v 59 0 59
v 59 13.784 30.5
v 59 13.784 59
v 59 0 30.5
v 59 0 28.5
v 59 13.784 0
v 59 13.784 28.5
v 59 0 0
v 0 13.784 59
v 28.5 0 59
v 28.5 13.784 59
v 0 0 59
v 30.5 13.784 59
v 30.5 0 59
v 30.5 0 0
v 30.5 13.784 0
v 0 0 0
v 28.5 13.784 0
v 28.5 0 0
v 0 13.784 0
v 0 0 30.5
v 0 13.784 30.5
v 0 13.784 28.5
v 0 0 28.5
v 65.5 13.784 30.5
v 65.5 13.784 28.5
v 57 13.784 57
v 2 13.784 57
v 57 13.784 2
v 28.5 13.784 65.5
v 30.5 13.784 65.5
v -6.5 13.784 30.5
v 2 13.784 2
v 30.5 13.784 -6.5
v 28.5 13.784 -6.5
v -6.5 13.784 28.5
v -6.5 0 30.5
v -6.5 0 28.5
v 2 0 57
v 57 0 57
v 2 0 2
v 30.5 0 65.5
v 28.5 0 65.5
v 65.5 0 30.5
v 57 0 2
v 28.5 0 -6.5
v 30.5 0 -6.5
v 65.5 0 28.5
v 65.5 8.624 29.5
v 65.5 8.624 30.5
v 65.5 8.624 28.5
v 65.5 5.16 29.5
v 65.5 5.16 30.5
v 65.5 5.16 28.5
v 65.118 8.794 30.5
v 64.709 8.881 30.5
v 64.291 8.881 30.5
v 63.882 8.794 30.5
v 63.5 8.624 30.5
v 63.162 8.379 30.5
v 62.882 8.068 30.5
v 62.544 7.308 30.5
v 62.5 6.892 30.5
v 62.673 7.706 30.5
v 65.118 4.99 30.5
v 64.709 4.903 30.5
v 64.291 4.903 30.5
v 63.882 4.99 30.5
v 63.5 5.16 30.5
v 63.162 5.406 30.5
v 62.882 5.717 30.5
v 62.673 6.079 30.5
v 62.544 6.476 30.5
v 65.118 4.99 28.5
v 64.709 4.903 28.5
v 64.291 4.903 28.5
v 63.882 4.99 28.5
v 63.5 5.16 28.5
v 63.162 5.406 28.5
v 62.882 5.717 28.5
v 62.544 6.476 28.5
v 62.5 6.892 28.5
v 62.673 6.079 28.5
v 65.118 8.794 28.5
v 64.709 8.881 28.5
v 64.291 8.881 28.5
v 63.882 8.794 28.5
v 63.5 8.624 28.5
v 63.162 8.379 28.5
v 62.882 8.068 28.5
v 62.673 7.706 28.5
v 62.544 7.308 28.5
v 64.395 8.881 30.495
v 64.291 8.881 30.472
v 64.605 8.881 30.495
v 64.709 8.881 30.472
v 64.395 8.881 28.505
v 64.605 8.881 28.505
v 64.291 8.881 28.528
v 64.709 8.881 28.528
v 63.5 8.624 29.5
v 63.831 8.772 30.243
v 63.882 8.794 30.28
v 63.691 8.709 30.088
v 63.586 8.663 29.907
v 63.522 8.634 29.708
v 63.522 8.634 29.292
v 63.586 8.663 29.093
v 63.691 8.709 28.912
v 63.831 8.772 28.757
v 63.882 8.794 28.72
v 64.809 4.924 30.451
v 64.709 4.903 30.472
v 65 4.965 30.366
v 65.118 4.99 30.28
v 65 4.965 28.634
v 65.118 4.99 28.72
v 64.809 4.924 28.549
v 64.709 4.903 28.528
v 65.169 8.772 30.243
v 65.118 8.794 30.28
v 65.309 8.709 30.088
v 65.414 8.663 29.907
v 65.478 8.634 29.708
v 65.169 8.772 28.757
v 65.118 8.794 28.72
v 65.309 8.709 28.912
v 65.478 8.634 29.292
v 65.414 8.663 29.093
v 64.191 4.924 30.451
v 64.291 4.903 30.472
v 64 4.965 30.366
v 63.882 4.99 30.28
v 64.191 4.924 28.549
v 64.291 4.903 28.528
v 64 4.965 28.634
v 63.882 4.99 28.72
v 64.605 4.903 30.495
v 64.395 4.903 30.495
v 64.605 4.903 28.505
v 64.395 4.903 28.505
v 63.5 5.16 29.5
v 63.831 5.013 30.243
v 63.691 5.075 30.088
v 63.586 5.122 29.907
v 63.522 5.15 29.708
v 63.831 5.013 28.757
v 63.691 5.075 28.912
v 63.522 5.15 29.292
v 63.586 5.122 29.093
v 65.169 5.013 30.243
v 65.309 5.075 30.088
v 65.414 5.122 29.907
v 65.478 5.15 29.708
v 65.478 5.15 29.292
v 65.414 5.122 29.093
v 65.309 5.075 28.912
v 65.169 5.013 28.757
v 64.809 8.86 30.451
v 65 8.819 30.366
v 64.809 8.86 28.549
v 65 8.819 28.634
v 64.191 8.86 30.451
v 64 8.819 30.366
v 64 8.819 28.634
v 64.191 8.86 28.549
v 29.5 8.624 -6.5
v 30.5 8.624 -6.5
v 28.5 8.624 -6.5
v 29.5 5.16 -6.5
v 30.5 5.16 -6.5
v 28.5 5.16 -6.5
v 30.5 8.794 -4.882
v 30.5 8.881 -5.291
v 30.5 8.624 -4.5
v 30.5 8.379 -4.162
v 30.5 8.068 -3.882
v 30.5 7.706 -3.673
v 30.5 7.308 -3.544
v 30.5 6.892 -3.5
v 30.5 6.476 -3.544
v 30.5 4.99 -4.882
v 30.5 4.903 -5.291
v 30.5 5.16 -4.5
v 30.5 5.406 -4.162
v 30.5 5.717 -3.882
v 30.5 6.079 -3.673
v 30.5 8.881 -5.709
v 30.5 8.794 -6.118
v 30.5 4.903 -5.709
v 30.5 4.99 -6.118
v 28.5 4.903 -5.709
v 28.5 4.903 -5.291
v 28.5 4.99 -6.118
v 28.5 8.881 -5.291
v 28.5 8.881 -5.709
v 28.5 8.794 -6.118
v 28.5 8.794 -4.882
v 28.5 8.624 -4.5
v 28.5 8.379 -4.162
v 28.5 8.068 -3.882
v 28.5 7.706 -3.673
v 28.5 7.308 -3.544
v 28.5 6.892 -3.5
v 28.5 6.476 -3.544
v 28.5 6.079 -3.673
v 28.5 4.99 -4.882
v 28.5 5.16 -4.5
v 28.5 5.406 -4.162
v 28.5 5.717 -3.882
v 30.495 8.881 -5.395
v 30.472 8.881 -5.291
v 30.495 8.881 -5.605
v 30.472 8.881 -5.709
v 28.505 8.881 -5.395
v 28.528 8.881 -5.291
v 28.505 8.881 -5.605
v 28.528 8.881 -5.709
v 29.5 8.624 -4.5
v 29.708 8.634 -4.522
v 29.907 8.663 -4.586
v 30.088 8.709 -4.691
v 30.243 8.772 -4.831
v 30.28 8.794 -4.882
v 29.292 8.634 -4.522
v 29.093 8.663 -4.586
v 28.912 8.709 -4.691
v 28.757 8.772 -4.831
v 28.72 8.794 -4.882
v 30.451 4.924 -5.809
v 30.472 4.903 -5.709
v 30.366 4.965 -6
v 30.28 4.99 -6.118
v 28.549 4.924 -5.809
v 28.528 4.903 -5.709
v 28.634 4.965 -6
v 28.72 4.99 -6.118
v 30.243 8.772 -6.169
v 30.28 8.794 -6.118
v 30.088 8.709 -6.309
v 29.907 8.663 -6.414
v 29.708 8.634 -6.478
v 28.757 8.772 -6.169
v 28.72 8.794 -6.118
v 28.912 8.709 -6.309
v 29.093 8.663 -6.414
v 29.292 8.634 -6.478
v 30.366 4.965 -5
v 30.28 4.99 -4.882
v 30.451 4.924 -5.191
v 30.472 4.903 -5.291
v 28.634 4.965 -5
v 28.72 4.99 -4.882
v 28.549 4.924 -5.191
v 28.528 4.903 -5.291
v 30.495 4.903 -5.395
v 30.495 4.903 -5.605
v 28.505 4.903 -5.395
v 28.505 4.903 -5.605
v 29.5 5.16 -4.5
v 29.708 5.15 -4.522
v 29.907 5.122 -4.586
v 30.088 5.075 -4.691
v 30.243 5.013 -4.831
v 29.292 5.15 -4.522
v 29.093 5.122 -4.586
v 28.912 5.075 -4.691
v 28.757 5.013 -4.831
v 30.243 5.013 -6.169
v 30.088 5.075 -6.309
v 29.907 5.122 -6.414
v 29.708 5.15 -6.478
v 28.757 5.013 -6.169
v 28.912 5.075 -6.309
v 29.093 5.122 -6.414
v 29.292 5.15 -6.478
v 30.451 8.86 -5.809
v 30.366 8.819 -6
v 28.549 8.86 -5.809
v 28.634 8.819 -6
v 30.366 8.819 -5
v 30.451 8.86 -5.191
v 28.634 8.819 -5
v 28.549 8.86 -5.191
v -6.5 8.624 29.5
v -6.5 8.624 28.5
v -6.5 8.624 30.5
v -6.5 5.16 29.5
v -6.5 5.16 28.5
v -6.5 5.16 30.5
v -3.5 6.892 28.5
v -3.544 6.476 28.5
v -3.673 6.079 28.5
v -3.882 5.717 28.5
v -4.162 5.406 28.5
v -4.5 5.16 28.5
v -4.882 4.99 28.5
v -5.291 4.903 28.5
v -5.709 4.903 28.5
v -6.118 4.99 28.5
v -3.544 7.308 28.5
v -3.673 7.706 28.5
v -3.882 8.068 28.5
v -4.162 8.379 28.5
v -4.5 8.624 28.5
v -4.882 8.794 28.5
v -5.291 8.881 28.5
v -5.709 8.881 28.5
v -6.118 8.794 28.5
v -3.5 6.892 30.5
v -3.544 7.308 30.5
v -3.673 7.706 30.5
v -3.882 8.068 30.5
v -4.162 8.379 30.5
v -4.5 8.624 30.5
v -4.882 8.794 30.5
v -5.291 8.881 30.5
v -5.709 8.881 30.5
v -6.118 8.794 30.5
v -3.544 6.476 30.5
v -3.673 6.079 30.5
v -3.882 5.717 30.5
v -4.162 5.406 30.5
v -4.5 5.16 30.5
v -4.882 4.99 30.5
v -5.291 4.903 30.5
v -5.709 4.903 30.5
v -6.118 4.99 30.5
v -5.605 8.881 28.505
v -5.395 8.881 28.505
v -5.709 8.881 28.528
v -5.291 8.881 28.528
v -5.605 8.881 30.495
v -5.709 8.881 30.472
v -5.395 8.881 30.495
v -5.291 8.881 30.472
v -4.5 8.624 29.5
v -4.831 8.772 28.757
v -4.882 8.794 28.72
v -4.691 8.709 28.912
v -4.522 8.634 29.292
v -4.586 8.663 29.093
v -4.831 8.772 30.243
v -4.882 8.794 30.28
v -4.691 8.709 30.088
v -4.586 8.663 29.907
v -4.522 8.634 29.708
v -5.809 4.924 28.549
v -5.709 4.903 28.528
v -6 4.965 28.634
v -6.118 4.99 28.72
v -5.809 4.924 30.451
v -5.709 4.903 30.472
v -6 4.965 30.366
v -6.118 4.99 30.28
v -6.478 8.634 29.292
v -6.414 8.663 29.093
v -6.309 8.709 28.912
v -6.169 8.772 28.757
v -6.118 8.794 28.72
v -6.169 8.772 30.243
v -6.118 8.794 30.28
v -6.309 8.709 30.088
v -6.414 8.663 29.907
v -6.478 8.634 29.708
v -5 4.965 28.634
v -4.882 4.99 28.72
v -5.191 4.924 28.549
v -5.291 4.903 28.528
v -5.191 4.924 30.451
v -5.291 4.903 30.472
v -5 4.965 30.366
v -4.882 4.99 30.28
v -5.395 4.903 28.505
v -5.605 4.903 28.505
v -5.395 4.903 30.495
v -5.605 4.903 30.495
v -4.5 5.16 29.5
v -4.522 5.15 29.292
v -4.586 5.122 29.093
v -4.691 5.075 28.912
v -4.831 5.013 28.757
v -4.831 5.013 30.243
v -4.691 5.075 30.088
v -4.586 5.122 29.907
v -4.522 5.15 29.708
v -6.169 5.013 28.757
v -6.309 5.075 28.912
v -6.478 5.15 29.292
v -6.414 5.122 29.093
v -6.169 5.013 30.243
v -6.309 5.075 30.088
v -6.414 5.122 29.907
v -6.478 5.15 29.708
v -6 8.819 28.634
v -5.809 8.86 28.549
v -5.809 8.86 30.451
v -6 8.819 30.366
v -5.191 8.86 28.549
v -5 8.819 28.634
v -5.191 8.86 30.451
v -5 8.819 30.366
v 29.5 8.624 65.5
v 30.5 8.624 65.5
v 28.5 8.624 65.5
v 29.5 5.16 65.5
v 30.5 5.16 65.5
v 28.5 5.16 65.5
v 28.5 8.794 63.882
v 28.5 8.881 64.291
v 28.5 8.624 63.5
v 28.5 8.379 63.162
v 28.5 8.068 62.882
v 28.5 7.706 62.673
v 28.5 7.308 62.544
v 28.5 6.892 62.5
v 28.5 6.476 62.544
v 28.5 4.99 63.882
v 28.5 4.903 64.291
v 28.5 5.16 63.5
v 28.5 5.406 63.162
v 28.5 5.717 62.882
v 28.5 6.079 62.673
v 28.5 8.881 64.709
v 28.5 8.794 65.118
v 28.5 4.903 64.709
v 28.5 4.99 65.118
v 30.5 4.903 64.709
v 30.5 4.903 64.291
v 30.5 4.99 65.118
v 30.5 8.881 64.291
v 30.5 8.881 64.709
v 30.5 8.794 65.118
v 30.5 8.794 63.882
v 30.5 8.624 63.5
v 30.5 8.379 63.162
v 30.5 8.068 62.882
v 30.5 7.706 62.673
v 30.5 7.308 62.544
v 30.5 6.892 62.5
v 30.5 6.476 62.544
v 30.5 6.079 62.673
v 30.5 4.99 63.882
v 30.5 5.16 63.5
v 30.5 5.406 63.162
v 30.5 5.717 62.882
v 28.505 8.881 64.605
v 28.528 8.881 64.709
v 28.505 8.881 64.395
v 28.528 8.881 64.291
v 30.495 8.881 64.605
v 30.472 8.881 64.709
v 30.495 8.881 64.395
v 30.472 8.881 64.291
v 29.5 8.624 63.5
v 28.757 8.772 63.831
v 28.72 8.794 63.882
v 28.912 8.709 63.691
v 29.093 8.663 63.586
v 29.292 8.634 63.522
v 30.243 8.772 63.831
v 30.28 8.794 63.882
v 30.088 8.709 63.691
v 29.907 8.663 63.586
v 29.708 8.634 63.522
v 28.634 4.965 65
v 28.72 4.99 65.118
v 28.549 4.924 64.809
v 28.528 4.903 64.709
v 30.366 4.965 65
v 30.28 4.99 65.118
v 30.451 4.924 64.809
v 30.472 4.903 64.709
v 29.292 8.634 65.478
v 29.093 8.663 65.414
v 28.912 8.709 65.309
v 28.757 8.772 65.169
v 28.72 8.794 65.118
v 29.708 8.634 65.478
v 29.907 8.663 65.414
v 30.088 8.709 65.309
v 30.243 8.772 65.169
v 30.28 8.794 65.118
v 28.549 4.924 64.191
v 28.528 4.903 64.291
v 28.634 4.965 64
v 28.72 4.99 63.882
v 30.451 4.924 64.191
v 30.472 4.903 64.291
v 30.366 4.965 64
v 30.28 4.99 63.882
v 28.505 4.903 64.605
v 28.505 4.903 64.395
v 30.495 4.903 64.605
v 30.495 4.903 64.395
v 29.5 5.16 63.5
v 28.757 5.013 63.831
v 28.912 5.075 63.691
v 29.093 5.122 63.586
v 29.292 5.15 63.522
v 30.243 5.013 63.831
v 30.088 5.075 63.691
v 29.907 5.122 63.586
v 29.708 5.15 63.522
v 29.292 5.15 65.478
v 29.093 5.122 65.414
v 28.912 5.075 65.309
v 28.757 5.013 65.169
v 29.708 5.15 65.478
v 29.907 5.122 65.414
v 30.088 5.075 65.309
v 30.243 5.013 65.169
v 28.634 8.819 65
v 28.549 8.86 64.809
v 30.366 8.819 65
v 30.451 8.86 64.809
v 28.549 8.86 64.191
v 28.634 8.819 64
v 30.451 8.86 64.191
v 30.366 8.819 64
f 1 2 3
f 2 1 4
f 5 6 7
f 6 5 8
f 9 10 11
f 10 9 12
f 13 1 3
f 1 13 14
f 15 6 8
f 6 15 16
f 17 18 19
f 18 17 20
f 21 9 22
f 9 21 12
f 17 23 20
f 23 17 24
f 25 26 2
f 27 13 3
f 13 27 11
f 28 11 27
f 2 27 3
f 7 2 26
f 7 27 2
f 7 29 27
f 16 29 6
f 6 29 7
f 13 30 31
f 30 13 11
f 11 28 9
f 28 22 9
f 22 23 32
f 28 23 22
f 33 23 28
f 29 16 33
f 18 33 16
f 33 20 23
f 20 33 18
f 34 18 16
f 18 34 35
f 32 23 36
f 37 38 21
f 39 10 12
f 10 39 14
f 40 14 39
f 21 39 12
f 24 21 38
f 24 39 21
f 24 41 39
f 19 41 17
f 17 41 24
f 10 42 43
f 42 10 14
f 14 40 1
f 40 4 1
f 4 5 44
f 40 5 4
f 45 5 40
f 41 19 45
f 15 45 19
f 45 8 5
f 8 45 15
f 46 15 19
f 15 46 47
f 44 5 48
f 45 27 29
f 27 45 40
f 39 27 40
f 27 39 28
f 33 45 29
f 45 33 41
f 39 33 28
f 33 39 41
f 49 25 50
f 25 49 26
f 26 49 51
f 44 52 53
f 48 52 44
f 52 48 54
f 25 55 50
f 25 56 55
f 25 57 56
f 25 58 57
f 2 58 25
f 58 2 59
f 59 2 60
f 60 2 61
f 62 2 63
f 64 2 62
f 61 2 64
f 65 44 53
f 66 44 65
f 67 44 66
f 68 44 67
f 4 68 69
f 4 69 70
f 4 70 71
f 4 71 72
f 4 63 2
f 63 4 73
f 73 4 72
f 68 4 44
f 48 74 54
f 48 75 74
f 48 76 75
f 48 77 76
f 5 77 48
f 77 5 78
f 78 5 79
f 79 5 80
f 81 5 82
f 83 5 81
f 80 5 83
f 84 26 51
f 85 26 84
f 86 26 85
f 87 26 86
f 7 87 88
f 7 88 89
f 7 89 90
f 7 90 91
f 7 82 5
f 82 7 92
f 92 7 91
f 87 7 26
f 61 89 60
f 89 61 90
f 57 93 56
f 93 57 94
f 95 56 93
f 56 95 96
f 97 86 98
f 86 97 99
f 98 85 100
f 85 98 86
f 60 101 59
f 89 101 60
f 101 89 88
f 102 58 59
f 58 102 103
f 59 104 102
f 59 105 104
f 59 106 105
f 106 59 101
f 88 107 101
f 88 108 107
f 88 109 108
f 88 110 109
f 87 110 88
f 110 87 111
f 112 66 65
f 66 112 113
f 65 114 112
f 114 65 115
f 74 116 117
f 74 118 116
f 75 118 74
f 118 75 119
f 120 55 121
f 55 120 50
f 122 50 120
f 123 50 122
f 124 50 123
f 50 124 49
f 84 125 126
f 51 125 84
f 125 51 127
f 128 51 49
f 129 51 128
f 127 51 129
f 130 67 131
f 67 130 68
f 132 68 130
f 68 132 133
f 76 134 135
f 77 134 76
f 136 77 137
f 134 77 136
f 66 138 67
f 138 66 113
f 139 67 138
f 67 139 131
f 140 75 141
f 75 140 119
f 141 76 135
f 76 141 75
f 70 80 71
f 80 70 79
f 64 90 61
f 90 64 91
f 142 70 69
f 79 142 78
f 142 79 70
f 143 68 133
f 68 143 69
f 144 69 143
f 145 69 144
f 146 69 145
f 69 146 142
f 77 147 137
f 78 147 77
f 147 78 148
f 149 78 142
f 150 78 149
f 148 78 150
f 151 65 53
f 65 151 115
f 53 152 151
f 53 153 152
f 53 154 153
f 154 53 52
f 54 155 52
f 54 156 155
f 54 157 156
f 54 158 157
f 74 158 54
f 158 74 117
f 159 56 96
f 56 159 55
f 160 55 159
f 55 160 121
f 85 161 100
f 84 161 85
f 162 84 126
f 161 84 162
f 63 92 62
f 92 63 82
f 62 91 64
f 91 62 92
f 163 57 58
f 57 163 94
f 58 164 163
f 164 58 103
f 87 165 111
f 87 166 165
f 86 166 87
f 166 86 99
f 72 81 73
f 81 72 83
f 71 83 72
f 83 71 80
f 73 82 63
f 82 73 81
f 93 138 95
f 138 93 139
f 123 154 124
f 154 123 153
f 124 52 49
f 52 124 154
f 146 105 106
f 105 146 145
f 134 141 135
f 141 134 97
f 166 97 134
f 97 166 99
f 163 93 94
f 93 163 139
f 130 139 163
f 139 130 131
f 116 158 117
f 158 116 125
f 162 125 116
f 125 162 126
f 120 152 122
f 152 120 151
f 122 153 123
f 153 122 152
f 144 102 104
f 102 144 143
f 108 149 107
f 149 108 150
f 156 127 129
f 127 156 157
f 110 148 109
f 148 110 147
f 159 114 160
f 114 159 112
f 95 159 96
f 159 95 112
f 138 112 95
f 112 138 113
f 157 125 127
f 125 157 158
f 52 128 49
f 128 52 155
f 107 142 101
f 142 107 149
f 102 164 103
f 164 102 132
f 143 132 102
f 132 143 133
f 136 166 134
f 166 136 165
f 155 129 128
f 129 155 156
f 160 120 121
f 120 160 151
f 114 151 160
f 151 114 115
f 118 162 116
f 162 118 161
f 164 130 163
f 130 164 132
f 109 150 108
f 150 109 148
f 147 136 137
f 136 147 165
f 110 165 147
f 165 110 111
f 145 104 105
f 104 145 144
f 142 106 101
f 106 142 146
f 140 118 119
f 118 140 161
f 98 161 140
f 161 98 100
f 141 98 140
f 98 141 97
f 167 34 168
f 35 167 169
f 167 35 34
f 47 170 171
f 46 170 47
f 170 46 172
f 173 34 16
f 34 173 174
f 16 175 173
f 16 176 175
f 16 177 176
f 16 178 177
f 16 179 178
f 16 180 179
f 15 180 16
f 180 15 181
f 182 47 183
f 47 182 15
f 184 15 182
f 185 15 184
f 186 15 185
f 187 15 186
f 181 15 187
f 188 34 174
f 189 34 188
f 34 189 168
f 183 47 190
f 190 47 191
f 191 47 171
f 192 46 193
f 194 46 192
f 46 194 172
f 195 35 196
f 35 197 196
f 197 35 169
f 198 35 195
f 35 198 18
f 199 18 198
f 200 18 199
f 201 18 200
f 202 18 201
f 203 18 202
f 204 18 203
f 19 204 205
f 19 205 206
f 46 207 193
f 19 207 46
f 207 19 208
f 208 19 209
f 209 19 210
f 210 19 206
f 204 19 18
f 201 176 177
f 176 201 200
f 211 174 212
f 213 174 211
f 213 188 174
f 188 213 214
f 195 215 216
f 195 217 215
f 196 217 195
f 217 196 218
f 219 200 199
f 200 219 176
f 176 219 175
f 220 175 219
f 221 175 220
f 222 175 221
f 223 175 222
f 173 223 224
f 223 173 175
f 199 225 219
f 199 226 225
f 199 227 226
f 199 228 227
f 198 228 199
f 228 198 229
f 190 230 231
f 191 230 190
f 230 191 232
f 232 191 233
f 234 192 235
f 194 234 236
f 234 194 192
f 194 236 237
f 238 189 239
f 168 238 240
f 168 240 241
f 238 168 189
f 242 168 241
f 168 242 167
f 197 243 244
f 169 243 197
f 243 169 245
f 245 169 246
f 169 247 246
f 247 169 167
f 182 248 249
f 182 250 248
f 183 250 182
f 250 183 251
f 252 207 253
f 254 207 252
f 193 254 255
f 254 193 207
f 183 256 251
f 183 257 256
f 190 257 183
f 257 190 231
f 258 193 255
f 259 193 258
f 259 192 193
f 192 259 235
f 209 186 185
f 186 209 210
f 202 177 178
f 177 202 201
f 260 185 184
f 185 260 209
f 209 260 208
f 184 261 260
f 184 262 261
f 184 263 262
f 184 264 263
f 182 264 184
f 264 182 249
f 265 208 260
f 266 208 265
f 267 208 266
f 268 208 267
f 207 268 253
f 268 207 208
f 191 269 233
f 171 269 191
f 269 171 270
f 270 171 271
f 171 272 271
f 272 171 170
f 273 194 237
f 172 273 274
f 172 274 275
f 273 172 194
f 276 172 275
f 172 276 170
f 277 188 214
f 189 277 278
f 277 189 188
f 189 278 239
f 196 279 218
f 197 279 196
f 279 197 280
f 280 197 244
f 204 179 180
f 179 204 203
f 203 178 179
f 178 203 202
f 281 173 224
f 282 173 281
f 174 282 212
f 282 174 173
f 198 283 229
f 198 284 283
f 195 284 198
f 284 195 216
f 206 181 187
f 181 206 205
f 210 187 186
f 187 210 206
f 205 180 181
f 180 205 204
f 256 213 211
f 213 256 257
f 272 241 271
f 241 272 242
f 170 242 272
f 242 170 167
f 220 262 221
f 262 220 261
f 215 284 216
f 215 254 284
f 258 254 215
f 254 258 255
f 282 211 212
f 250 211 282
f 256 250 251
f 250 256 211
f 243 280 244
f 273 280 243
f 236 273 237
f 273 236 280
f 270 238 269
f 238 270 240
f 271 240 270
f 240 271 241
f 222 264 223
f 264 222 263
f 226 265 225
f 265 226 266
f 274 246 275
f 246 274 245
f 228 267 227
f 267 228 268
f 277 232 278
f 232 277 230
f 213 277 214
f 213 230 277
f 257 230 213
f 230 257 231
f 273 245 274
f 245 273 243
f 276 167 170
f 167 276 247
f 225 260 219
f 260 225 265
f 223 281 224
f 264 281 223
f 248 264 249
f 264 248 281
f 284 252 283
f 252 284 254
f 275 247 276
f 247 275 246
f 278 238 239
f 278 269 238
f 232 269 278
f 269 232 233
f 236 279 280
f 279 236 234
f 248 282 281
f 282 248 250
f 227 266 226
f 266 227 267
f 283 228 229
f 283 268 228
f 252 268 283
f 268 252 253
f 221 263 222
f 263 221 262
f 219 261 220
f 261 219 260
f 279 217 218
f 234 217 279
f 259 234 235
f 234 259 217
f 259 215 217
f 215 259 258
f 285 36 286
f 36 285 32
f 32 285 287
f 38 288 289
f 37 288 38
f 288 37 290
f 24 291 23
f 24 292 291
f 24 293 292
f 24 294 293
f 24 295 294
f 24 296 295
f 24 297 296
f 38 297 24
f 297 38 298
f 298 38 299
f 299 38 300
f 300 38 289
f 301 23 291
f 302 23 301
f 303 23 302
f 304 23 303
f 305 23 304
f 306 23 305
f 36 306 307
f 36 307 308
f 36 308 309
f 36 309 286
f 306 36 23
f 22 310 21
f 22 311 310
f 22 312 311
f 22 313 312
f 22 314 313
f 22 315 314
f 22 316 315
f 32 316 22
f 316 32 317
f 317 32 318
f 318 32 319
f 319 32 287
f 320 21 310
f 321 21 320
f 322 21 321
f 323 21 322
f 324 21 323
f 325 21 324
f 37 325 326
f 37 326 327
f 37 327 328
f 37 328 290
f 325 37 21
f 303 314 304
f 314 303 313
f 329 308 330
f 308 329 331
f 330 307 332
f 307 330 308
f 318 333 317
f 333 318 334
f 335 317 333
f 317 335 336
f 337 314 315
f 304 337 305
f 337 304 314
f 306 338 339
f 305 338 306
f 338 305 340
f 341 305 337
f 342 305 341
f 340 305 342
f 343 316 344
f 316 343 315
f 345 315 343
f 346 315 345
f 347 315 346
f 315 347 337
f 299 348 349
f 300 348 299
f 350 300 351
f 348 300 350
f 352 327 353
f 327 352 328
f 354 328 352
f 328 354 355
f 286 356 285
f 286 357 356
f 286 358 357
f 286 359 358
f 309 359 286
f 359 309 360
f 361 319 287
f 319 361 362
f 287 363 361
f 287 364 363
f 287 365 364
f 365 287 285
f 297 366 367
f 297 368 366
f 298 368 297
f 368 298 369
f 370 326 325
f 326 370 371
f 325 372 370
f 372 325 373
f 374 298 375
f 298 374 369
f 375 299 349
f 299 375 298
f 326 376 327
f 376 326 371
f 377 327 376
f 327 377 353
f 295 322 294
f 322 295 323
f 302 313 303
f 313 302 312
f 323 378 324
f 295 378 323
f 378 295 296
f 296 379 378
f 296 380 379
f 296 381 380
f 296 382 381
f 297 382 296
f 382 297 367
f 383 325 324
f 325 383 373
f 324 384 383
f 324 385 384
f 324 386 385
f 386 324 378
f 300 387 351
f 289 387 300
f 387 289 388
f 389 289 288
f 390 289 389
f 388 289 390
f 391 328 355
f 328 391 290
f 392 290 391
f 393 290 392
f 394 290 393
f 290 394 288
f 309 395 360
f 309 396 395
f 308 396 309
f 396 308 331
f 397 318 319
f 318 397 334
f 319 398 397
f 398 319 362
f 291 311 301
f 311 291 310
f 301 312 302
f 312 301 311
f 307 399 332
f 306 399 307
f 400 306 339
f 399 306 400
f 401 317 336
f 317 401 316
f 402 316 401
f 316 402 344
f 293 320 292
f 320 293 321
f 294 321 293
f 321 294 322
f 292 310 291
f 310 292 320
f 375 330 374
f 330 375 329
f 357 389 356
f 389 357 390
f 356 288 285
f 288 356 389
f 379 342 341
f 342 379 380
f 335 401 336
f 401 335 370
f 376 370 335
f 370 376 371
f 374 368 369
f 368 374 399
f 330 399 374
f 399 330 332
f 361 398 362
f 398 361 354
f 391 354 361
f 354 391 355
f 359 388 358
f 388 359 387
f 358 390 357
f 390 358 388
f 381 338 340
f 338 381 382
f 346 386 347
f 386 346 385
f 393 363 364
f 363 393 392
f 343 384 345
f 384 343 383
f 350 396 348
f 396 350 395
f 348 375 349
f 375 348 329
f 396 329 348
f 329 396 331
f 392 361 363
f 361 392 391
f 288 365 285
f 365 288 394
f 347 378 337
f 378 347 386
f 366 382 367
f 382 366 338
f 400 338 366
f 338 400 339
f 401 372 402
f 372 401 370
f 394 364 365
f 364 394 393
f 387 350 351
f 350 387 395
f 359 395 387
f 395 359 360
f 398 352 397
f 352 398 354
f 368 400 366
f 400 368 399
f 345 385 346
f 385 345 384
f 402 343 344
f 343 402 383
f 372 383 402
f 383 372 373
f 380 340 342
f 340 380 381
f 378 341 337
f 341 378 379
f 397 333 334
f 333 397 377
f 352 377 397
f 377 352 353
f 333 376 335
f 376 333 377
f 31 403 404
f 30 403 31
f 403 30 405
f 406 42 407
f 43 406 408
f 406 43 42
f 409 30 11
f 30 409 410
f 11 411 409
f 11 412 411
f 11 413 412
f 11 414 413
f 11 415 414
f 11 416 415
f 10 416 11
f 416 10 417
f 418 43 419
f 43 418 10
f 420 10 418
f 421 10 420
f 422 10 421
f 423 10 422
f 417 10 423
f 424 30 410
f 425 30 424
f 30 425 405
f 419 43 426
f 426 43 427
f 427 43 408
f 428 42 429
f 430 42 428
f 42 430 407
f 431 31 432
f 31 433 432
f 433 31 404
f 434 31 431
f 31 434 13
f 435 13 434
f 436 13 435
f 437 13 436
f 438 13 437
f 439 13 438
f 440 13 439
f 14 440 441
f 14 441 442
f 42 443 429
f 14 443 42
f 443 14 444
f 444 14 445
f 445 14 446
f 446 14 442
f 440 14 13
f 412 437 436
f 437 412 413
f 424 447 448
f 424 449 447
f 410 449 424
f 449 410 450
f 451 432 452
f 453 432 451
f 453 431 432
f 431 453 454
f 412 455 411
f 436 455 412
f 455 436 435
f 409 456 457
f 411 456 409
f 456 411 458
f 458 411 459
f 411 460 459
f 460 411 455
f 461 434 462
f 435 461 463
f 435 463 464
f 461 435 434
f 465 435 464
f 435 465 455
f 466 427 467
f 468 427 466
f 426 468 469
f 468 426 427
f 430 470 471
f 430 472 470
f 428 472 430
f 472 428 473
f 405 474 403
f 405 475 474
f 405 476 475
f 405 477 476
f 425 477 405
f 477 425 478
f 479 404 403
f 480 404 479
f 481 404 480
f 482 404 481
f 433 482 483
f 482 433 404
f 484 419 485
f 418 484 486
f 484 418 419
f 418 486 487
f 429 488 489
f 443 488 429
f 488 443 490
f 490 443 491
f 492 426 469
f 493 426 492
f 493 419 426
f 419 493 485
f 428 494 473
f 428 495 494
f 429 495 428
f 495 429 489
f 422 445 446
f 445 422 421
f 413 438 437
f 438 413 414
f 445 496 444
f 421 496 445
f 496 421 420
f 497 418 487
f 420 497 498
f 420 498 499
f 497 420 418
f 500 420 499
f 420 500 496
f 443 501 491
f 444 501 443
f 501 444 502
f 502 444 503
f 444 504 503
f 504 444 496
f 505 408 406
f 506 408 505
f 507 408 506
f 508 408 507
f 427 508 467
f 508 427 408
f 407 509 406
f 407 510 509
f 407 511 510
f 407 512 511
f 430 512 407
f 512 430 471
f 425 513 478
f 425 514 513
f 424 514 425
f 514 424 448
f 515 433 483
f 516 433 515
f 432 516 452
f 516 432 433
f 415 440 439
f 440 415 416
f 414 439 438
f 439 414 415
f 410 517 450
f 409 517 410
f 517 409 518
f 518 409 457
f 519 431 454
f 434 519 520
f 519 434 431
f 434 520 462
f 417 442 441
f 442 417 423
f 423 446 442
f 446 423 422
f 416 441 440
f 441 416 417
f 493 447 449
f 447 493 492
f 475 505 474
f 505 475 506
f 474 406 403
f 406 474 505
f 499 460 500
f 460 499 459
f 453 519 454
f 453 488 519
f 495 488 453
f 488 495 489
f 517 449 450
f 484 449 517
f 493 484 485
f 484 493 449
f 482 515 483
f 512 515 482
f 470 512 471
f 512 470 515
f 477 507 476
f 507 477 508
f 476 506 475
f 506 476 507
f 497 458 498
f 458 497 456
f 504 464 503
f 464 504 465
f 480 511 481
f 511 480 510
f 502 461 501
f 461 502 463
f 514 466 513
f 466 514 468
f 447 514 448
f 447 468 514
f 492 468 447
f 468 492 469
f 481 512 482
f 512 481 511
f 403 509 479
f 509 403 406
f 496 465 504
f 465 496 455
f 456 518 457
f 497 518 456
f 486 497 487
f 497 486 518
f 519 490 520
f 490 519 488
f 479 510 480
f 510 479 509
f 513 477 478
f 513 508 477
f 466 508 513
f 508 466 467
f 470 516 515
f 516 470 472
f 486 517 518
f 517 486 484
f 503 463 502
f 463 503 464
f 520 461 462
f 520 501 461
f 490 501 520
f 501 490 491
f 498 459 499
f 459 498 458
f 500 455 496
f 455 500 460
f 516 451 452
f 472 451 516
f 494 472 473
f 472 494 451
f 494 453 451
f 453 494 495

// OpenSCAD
/**
 * Copyright 2018 Mike and Nathan Fairhurst. See LICENSE for licensing.
 */

// module that can help measure the torque of a real cube
// specify:
//   - height/width/depth of the cube
//   - the thickness of the measurer
//   - the number of layers of the cube
//   - the lever distance from where you'll measure the torque
//
// To use the device, place it on a layer, and tie a weight to a weight point
// that is perpendicular to the floor.  If the cube rotates, it must take less than
// weight/lever_length to move the cube.
module torque_tester(cube_size, wall_thickness, layer_count, lever_length) {
  difference() {
    cube([cube_size + wall_thickness * 2, cube_size / (layer_count * 1.33), cube_size + wall_thickness * 2]);
    translate([wall_thickness,-cube_size/(layer_count*1.33),wall_thickness]) cube([cube_size, cube_size*3/(layer_count*1.33), cube_size]);
  }
  translate([cube_size/2 + wall_thickness,0,cube_size/2 + wall_thickness])
  union() {
    for (i=[0:3])
    rotate(i*90,[0,1,0])
    translate([cube_size/2 + wall_thickness,0,-wall_thickness/2])
      wing(cube_size/(layer_count*1.33), lever_length - cube_size/2 - wall_thickness, wall_thickness);
  }
}

module wing(width, depth, wall_thickness) {
  union() {
    difference() {
      cube([depth+wall_thickness/2,width,wall_thickness]);
      translate([depth, width/2, -wall_thickness])
        cylinder(wall_thickness*3, wall_thickness, wall_thickness, $fn=30);
    };
    translate([depth, width/2, wall_thickness/2])
    rotate([90, 0, 0])
    translate([0, 0, -wall_thickness])
      cylinder(wall_thickness*2, wall_thickness/2, wall_thickness/2, $fn=30);
  }
}

_cube_size = 55;
_wall_thickness = 2;
_layer_count = 3;
_lever_length = 35;

color("blue", 0.8) torque_tester(_cube_size, _wall_thickness, _layer_count, _lever_length);
